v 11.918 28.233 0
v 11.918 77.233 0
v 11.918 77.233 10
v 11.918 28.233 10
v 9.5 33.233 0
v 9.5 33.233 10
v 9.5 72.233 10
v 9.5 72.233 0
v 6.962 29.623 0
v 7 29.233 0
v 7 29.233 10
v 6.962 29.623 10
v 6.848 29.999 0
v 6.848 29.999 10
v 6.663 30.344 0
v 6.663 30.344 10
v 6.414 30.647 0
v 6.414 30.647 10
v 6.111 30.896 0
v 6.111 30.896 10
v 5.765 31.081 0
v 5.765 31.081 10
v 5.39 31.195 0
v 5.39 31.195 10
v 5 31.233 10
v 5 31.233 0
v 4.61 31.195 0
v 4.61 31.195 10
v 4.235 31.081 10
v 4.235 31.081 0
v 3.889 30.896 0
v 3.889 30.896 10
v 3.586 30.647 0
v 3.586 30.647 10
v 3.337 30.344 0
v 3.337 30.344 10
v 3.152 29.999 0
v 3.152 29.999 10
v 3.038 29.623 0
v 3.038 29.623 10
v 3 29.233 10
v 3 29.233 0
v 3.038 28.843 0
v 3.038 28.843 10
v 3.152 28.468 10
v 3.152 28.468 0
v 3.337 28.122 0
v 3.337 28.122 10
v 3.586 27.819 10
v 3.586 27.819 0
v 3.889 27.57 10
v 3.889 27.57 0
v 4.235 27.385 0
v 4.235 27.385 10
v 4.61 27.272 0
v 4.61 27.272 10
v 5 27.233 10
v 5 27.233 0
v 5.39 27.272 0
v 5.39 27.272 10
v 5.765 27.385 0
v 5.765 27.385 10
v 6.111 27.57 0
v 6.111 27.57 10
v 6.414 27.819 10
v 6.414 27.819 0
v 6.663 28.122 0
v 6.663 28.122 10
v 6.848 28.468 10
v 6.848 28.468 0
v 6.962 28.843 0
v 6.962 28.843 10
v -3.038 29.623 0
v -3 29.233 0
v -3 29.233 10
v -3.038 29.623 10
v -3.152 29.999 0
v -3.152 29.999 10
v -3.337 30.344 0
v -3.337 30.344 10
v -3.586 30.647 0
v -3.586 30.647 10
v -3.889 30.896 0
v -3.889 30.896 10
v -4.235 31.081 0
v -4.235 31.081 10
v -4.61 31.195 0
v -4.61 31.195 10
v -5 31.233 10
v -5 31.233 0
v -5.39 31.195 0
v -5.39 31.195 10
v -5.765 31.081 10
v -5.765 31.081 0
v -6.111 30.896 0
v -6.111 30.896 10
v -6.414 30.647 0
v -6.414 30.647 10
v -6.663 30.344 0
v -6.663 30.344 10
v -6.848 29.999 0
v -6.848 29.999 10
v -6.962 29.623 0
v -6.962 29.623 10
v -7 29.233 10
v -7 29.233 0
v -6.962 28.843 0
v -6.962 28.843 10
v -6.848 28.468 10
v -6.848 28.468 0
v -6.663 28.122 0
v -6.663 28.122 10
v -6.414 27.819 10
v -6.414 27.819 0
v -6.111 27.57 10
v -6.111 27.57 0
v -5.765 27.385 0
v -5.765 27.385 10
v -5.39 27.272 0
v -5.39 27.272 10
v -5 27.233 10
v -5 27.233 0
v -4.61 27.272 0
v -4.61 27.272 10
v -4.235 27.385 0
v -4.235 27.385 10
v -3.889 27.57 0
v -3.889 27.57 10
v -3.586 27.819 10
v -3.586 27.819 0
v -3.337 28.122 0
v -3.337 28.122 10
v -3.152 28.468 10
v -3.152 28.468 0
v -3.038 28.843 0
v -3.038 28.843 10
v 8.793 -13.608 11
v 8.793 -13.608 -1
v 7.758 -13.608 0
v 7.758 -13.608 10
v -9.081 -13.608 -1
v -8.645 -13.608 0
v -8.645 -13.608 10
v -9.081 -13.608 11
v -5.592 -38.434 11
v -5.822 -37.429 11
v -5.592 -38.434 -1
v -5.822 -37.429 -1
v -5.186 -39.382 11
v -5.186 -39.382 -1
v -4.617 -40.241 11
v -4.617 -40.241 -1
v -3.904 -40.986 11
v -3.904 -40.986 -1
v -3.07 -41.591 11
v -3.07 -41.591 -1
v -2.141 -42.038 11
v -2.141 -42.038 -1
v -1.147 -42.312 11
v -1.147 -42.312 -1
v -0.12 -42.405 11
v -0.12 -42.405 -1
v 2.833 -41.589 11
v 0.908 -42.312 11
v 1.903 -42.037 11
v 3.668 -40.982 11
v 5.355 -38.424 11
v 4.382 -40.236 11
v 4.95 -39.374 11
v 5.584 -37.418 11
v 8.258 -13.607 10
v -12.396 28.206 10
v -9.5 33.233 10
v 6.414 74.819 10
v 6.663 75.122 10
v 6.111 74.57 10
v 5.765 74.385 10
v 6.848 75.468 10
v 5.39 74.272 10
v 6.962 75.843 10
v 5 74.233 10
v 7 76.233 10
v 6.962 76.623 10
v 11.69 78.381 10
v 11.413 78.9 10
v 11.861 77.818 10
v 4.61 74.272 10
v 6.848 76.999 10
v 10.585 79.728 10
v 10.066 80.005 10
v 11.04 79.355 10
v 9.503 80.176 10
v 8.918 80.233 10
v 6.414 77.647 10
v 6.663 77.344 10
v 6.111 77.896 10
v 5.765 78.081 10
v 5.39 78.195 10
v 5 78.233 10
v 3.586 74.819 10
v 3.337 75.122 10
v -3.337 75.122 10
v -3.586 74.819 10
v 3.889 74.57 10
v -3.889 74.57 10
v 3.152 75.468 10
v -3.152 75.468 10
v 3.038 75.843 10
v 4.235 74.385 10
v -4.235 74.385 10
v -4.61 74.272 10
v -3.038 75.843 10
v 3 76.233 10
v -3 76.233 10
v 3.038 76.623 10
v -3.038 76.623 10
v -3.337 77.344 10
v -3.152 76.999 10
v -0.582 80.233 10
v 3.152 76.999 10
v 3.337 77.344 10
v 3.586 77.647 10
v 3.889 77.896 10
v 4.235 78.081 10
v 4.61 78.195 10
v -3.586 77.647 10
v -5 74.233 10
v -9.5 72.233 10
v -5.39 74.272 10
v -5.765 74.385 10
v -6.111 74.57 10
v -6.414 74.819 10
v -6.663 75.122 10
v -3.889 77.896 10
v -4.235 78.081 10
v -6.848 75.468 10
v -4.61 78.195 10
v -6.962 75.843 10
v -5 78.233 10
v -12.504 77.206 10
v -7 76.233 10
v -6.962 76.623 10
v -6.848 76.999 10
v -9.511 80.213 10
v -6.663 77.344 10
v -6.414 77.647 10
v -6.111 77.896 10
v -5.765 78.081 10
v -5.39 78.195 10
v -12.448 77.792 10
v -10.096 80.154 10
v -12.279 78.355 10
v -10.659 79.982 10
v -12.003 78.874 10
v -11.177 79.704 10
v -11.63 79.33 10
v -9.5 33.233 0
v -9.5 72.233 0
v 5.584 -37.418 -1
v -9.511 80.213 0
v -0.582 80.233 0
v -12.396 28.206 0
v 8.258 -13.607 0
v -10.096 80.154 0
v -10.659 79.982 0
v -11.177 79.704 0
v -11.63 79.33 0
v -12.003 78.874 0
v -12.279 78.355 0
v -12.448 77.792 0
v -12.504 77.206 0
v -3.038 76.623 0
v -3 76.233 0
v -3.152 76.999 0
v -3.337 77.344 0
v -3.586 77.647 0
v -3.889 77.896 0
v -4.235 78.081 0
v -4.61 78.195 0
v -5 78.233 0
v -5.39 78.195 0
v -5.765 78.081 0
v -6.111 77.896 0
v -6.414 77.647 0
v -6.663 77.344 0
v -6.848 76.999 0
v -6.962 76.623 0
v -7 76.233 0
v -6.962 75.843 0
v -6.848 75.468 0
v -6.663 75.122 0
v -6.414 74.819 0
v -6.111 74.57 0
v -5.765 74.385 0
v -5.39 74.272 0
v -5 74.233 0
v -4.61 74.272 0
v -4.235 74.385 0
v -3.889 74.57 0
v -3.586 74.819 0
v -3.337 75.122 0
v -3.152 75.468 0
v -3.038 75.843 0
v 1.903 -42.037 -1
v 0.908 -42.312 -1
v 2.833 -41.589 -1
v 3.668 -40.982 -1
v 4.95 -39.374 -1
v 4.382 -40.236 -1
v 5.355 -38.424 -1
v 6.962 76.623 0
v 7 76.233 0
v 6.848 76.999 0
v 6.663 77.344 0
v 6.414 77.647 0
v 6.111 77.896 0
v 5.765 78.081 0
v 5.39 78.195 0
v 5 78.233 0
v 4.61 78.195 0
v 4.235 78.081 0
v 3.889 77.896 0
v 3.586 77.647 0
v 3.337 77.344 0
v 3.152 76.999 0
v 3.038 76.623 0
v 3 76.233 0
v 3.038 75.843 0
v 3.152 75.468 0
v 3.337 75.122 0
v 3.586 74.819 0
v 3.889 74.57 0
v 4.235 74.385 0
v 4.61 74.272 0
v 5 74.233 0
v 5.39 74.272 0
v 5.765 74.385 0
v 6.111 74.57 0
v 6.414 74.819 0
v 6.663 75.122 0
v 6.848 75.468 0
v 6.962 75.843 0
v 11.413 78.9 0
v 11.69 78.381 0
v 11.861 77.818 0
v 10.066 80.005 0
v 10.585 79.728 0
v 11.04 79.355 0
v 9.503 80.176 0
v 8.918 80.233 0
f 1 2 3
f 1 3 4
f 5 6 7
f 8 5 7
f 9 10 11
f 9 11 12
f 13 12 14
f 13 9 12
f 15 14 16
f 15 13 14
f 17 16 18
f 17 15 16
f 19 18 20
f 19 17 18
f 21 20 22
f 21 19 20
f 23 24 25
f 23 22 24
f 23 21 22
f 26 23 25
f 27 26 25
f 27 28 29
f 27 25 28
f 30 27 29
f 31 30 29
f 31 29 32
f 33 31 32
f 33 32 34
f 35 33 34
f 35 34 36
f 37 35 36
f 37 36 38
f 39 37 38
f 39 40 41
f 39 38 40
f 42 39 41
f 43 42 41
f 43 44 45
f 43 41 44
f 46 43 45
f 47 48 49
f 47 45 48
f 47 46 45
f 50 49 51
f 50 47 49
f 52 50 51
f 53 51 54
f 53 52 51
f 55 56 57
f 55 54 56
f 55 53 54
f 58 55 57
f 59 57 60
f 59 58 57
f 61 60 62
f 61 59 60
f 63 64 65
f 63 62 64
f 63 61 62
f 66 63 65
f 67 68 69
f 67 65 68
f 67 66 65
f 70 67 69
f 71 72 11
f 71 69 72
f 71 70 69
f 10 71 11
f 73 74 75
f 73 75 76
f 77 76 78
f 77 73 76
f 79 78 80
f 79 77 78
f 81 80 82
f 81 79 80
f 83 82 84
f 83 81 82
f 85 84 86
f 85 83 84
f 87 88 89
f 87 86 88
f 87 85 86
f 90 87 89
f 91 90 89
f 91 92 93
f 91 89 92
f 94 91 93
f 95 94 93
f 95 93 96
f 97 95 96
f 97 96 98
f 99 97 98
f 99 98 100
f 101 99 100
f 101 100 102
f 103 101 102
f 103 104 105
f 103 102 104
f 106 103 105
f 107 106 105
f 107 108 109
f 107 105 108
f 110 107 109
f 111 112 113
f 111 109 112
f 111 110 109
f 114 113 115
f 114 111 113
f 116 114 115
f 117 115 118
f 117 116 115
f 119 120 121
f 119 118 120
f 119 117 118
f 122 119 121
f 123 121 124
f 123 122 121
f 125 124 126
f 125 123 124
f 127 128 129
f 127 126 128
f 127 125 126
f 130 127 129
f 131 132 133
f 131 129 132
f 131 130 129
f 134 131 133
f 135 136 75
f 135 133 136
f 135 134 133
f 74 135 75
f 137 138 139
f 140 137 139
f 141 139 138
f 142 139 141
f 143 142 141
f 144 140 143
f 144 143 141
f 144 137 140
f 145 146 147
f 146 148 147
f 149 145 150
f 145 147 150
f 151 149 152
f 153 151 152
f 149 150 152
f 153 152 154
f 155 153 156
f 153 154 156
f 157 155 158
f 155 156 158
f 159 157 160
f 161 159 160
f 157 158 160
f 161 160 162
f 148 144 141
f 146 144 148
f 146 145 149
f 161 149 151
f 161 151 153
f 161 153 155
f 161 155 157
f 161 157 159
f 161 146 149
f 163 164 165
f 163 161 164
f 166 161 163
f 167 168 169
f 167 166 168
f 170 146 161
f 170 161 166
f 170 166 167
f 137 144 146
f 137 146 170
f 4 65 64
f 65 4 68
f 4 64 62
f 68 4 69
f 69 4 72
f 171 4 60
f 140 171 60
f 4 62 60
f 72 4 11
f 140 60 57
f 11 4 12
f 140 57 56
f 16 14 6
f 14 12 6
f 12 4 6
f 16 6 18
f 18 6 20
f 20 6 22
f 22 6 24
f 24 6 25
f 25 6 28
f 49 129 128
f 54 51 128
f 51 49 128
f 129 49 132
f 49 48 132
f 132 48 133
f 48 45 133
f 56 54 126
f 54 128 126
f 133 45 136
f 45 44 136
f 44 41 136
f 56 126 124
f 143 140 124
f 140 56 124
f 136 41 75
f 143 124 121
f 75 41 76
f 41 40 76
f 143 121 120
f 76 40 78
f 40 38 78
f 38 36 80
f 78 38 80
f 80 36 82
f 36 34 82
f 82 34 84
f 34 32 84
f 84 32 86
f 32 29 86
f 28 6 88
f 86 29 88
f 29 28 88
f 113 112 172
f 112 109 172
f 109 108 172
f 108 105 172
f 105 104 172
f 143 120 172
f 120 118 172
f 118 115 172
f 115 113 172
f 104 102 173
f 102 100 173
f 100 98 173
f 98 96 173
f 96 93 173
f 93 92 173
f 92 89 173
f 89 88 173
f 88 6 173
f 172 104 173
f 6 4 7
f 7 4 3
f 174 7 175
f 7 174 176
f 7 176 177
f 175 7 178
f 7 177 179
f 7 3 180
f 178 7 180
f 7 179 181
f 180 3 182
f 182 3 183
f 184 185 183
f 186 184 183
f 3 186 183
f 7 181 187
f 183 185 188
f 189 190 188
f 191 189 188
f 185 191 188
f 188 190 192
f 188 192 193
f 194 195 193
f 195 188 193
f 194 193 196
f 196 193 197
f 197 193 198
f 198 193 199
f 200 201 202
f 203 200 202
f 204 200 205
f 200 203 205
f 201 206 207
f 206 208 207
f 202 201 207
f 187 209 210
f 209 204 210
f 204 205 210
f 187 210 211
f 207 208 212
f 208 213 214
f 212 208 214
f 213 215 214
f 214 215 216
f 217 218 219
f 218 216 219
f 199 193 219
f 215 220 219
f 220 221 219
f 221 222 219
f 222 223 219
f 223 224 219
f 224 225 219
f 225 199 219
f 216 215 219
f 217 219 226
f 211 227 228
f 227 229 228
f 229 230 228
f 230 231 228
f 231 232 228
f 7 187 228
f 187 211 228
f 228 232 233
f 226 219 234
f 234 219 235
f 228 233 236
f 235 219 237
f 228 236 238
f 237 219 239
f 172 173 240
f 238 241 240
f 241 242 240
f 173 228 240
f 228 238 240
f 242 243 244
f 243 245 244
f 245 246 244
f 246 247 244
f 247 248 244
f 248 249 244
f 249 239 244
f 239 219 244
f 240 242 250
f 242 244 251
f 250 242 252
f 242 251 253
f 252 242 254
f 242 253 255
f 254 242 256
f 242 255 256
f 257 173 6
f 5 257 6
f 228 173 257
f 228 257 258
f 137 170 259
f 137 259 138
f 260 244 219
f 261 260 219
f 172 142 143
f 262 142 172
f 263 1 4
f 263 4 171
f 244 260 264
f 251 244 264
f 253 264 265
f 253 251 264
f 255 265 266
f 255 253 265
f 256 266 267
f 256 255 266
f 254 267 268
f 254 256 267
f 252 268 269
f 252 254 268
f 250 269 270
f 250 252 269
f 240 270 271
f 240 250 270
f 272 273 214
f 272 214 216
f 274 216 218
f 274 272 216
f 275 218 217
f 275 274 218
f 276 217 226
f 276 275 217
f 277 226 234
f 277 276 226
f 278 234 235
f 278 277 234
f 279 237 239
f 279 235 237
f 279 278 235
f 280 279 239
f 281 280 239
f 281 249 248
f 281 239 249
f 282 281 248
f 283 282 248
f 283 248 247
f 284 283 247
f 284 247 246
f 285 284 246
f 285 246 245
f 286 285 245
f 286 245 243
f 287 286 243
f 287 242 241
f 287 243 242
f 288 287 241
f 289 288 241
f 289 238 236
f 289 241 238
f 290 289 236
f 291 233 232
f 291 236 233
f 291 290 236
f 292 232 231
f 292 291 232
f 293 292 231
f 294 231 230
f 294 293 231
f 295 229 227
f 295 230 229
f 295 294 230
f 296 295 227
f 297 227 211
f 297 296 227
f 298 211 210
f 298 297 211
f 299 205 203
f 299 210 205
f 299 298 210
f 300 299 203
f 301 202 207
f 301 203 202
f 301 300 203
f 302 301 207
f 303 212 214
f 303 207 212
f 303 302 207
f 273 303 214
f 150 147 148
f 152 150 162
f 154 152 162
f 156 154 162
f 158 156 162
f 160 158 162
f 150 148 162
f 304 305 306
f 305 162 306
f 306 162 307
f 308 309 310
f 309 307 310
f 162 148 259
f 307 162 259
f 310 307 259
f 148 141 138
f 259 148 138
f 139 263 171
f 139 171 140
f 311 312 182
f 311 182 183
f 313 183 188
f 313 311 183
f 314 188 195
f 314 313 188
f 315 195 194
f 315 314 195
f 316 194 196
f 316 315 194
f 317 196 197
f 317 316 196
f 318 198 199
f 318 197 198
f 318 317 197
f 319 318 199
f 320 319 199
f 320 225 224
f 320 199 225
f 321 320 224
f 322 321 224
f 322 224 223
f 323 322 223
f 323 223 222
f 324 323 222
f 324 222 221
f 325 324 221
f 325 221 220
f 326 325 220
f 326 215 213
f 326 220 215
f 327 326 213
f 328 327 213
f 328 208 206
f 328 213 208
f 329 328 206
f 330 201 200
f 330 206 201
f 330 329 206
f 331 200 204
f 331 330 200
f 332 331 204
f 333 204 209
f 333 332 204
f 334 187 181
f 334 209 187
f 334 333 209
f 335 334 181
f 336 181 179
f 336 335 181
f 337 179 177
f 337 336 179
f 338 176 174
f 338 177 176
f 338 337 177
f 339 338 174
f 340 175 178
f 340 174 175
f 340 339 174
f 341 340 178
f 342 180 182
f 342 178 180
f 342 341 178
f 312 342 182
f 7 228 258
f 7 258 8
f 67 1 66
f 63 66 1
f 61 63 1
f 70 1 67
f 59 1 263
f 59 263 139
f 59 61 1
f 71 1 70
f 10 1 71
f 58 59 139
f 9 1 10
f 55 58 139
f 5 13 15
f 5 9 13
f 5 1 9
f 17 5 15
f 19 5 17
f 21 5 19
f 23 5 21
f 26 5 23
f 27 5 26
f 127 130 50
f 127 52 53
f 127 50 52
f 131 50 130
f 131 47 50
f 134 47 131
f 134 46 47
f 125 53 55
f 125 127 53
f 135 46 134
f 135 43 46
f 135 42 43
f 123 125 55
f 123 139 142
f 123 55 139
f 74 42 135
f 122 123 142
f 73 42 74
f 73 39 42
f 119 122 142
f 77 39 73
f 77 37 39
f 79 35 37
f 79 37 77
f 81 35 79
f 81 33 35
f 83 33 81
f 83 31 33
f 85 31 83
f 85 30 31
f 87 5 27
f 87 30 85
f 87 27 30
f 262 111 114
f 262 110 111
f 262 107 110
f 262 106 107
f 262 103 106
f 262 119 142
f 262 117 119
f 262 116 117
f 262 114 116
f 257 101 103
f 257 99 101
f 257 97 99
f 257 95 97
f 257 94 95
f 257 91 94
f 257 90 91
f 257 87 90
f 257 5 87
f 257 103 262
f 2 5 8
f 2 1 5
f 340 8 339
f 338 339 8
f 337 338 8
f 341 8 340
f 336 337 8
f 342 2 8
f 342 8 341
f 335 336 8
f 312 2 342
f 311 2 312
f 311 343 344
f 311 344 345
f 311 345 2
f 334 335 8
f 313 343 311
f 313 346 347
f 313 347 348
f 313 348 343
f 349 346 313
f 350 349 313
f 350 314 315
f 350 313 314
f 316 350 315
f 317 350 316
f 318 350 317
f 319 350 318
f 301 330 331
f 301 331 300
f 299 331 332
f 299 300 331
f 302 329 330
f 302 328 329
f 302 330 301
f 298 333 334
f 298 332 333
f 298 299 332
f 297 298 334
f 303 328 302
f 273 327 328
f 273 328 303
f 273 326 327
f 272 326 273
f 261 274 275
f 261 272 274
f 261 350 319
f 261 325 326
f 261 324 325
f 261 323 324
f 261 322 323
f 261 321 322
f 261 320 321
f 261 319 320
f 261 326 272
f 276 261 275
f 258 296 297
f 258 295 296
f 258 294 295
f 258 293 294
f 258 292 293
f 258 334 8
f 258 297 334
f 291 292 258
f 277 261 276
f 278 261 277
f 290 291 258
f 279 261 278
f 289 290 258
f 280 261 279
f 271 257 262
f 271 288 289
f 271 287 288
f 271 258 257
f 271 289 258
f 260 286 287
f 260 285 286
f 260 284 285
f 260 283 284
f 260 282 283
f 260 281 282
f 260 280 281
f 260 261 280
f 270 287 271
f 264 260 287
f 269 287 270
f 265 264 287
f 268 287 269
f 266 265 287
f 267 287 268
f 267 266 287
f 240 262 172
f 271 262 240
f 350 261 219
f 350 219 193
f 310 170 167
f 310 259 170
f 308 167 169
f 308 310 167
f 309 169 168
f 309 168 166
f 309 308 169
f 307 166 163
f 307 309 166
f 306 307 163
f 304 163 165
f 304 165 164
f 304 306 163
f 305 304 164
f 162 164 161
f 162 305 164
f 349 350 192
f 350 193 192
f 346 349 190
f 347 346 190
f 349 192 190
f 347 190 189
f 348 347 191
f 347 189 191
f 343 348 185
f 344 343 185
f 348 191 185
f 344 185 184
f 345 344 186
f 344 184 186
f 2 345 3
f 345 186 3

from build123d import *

# Parameters (mm, degrees)
BOSS_EXTRU_1_DEPTH           = 10
ESQUISSE2_W                  = 19
ESQUISSE2_H                  = 39
ENL_V_MAT_EXTRU_1_DEPTH      = 14
ENL_V_MAT_EXTRU_2_DEPTH      = 15
ENL_V_MAT_EXTRU_2_DEPTH_BACK = 7
ESQUISSE3_R                  = 2
CONG_1_R                     = 3
CONG_2_R                     = 3
BOSS_EXTRU_4_DEPTH           = 1
BOSS_EXTRU_4_DEPTH_BACK      = 11
CONG_4_R                     = 5.755572


with BuildPart() as part:
    # Esquisse1 → Boss.-Extru.1 (new body)
    with BuildSketch(Plane.XY):
        Polygon((-0.581785688, 80.233199881), (11.918214312, 80.233199881), (11.918214312, 28.233199881), (8.257673117, -13.606977439), (7.257673726, -13.608081293), (3.5, -40.345319149), (0, -40.345319149), (-3.826627386, -40.353406678), (-7.643319911, -13.624529819), (-8.643319302, -13.625633672), (-12.396222382, 28.206360286), (-12.511023087, 80.206233562), align=None)
    extrude(amount=BOSS_EXTRU_1_DEPTH)

    # Esquisse2 → Enlèv. mat.-Extru.1 (cut)
    with BuildSketch(Plane.XY.offset(10)):
        with Locations((0, 52.733199881)):
            Rectangle(ESQUISSE2_W, ESQUISSE2_H)
    extrude(amount=-ENL_V_MAT_EXTRU_1_DEPTH, mode=Mode.SUBTRACT)

    # Esquisse3 → Enlèv. mat.-Extru.2 (cut, two sides: drawn at the far end of the back side and taken through both)
    with BuildSketch(Plane.XY.offset(-ENL_V_MAT_EXTRU_2_DEPTH_BACK)):
        with Locations((5, 76.233199881)):
            Circle(ESQUISSE3_R)
        with Locations((5, 29.233199881)):
            Circle(ESQUISSE3_R)
        with Locations((-5, 29.233199881)):
            Circle(ESQUISSE3_R)
        with Locations((-5, 76.233199881)):
            Circle(ESQUISSE3_R)
    extrude(amount=ENL_V_MAT_EXTRU_2_DEPTH + ENL_V_MAT_EXTRU_2_DEPTH_BACK, mode=Mode.SUBTRACT)

    # Congé1
    cong_1_edges = [part.edges().sort_by_distance(p)[0] for p in [
        (11.918214312, 80.233199881, 5),
    ]]
    fillet(cong_1_edges, radius=CONG_1_R)

    # Congé2
    cong_2_edges = [part.edges().sort_by_distance(p)[0] for p in [
        (-12.511023087, 80.206233562, 5),
    ]]
    fillet(cong_2_edges, radius=CONG_2_R)

    # Esquisse4 → Boss.-Extru.4 (add, two sides: drawn at the far end of the back side and taken through both)
    with BuildSketch(Plane(origin=(0, 0, 0), x_dir=(-1, 0, 0), z_dir=(0, 0, -1)).offset(-BOSS_EXTRU_4_DEPTH_BACK)):
        Polygon((-8.792588162, -13.607529366), (9.080964972, -13.607529366), (5.141727933, -42.4046649), (-4.912145705, -42.4046649), align=None)
    extrude(amount=BOSS_EXTRU_4_DEPTH + BOSS_EXTRU_4_DEPTH_BACK)

    # Congé4
    cong_4_edges = [part.edges().sort_by_distance(p)[0] for p in [
        (4.912145705, -42.4046649, 5),
        (-5.141727933, -42.4046649, 5),
    ]]
    fillet(cong_4_edges, radius=CONG_4_R - 0.0001)  # a hair under: the kernel refuses the full size


solid = part.part
